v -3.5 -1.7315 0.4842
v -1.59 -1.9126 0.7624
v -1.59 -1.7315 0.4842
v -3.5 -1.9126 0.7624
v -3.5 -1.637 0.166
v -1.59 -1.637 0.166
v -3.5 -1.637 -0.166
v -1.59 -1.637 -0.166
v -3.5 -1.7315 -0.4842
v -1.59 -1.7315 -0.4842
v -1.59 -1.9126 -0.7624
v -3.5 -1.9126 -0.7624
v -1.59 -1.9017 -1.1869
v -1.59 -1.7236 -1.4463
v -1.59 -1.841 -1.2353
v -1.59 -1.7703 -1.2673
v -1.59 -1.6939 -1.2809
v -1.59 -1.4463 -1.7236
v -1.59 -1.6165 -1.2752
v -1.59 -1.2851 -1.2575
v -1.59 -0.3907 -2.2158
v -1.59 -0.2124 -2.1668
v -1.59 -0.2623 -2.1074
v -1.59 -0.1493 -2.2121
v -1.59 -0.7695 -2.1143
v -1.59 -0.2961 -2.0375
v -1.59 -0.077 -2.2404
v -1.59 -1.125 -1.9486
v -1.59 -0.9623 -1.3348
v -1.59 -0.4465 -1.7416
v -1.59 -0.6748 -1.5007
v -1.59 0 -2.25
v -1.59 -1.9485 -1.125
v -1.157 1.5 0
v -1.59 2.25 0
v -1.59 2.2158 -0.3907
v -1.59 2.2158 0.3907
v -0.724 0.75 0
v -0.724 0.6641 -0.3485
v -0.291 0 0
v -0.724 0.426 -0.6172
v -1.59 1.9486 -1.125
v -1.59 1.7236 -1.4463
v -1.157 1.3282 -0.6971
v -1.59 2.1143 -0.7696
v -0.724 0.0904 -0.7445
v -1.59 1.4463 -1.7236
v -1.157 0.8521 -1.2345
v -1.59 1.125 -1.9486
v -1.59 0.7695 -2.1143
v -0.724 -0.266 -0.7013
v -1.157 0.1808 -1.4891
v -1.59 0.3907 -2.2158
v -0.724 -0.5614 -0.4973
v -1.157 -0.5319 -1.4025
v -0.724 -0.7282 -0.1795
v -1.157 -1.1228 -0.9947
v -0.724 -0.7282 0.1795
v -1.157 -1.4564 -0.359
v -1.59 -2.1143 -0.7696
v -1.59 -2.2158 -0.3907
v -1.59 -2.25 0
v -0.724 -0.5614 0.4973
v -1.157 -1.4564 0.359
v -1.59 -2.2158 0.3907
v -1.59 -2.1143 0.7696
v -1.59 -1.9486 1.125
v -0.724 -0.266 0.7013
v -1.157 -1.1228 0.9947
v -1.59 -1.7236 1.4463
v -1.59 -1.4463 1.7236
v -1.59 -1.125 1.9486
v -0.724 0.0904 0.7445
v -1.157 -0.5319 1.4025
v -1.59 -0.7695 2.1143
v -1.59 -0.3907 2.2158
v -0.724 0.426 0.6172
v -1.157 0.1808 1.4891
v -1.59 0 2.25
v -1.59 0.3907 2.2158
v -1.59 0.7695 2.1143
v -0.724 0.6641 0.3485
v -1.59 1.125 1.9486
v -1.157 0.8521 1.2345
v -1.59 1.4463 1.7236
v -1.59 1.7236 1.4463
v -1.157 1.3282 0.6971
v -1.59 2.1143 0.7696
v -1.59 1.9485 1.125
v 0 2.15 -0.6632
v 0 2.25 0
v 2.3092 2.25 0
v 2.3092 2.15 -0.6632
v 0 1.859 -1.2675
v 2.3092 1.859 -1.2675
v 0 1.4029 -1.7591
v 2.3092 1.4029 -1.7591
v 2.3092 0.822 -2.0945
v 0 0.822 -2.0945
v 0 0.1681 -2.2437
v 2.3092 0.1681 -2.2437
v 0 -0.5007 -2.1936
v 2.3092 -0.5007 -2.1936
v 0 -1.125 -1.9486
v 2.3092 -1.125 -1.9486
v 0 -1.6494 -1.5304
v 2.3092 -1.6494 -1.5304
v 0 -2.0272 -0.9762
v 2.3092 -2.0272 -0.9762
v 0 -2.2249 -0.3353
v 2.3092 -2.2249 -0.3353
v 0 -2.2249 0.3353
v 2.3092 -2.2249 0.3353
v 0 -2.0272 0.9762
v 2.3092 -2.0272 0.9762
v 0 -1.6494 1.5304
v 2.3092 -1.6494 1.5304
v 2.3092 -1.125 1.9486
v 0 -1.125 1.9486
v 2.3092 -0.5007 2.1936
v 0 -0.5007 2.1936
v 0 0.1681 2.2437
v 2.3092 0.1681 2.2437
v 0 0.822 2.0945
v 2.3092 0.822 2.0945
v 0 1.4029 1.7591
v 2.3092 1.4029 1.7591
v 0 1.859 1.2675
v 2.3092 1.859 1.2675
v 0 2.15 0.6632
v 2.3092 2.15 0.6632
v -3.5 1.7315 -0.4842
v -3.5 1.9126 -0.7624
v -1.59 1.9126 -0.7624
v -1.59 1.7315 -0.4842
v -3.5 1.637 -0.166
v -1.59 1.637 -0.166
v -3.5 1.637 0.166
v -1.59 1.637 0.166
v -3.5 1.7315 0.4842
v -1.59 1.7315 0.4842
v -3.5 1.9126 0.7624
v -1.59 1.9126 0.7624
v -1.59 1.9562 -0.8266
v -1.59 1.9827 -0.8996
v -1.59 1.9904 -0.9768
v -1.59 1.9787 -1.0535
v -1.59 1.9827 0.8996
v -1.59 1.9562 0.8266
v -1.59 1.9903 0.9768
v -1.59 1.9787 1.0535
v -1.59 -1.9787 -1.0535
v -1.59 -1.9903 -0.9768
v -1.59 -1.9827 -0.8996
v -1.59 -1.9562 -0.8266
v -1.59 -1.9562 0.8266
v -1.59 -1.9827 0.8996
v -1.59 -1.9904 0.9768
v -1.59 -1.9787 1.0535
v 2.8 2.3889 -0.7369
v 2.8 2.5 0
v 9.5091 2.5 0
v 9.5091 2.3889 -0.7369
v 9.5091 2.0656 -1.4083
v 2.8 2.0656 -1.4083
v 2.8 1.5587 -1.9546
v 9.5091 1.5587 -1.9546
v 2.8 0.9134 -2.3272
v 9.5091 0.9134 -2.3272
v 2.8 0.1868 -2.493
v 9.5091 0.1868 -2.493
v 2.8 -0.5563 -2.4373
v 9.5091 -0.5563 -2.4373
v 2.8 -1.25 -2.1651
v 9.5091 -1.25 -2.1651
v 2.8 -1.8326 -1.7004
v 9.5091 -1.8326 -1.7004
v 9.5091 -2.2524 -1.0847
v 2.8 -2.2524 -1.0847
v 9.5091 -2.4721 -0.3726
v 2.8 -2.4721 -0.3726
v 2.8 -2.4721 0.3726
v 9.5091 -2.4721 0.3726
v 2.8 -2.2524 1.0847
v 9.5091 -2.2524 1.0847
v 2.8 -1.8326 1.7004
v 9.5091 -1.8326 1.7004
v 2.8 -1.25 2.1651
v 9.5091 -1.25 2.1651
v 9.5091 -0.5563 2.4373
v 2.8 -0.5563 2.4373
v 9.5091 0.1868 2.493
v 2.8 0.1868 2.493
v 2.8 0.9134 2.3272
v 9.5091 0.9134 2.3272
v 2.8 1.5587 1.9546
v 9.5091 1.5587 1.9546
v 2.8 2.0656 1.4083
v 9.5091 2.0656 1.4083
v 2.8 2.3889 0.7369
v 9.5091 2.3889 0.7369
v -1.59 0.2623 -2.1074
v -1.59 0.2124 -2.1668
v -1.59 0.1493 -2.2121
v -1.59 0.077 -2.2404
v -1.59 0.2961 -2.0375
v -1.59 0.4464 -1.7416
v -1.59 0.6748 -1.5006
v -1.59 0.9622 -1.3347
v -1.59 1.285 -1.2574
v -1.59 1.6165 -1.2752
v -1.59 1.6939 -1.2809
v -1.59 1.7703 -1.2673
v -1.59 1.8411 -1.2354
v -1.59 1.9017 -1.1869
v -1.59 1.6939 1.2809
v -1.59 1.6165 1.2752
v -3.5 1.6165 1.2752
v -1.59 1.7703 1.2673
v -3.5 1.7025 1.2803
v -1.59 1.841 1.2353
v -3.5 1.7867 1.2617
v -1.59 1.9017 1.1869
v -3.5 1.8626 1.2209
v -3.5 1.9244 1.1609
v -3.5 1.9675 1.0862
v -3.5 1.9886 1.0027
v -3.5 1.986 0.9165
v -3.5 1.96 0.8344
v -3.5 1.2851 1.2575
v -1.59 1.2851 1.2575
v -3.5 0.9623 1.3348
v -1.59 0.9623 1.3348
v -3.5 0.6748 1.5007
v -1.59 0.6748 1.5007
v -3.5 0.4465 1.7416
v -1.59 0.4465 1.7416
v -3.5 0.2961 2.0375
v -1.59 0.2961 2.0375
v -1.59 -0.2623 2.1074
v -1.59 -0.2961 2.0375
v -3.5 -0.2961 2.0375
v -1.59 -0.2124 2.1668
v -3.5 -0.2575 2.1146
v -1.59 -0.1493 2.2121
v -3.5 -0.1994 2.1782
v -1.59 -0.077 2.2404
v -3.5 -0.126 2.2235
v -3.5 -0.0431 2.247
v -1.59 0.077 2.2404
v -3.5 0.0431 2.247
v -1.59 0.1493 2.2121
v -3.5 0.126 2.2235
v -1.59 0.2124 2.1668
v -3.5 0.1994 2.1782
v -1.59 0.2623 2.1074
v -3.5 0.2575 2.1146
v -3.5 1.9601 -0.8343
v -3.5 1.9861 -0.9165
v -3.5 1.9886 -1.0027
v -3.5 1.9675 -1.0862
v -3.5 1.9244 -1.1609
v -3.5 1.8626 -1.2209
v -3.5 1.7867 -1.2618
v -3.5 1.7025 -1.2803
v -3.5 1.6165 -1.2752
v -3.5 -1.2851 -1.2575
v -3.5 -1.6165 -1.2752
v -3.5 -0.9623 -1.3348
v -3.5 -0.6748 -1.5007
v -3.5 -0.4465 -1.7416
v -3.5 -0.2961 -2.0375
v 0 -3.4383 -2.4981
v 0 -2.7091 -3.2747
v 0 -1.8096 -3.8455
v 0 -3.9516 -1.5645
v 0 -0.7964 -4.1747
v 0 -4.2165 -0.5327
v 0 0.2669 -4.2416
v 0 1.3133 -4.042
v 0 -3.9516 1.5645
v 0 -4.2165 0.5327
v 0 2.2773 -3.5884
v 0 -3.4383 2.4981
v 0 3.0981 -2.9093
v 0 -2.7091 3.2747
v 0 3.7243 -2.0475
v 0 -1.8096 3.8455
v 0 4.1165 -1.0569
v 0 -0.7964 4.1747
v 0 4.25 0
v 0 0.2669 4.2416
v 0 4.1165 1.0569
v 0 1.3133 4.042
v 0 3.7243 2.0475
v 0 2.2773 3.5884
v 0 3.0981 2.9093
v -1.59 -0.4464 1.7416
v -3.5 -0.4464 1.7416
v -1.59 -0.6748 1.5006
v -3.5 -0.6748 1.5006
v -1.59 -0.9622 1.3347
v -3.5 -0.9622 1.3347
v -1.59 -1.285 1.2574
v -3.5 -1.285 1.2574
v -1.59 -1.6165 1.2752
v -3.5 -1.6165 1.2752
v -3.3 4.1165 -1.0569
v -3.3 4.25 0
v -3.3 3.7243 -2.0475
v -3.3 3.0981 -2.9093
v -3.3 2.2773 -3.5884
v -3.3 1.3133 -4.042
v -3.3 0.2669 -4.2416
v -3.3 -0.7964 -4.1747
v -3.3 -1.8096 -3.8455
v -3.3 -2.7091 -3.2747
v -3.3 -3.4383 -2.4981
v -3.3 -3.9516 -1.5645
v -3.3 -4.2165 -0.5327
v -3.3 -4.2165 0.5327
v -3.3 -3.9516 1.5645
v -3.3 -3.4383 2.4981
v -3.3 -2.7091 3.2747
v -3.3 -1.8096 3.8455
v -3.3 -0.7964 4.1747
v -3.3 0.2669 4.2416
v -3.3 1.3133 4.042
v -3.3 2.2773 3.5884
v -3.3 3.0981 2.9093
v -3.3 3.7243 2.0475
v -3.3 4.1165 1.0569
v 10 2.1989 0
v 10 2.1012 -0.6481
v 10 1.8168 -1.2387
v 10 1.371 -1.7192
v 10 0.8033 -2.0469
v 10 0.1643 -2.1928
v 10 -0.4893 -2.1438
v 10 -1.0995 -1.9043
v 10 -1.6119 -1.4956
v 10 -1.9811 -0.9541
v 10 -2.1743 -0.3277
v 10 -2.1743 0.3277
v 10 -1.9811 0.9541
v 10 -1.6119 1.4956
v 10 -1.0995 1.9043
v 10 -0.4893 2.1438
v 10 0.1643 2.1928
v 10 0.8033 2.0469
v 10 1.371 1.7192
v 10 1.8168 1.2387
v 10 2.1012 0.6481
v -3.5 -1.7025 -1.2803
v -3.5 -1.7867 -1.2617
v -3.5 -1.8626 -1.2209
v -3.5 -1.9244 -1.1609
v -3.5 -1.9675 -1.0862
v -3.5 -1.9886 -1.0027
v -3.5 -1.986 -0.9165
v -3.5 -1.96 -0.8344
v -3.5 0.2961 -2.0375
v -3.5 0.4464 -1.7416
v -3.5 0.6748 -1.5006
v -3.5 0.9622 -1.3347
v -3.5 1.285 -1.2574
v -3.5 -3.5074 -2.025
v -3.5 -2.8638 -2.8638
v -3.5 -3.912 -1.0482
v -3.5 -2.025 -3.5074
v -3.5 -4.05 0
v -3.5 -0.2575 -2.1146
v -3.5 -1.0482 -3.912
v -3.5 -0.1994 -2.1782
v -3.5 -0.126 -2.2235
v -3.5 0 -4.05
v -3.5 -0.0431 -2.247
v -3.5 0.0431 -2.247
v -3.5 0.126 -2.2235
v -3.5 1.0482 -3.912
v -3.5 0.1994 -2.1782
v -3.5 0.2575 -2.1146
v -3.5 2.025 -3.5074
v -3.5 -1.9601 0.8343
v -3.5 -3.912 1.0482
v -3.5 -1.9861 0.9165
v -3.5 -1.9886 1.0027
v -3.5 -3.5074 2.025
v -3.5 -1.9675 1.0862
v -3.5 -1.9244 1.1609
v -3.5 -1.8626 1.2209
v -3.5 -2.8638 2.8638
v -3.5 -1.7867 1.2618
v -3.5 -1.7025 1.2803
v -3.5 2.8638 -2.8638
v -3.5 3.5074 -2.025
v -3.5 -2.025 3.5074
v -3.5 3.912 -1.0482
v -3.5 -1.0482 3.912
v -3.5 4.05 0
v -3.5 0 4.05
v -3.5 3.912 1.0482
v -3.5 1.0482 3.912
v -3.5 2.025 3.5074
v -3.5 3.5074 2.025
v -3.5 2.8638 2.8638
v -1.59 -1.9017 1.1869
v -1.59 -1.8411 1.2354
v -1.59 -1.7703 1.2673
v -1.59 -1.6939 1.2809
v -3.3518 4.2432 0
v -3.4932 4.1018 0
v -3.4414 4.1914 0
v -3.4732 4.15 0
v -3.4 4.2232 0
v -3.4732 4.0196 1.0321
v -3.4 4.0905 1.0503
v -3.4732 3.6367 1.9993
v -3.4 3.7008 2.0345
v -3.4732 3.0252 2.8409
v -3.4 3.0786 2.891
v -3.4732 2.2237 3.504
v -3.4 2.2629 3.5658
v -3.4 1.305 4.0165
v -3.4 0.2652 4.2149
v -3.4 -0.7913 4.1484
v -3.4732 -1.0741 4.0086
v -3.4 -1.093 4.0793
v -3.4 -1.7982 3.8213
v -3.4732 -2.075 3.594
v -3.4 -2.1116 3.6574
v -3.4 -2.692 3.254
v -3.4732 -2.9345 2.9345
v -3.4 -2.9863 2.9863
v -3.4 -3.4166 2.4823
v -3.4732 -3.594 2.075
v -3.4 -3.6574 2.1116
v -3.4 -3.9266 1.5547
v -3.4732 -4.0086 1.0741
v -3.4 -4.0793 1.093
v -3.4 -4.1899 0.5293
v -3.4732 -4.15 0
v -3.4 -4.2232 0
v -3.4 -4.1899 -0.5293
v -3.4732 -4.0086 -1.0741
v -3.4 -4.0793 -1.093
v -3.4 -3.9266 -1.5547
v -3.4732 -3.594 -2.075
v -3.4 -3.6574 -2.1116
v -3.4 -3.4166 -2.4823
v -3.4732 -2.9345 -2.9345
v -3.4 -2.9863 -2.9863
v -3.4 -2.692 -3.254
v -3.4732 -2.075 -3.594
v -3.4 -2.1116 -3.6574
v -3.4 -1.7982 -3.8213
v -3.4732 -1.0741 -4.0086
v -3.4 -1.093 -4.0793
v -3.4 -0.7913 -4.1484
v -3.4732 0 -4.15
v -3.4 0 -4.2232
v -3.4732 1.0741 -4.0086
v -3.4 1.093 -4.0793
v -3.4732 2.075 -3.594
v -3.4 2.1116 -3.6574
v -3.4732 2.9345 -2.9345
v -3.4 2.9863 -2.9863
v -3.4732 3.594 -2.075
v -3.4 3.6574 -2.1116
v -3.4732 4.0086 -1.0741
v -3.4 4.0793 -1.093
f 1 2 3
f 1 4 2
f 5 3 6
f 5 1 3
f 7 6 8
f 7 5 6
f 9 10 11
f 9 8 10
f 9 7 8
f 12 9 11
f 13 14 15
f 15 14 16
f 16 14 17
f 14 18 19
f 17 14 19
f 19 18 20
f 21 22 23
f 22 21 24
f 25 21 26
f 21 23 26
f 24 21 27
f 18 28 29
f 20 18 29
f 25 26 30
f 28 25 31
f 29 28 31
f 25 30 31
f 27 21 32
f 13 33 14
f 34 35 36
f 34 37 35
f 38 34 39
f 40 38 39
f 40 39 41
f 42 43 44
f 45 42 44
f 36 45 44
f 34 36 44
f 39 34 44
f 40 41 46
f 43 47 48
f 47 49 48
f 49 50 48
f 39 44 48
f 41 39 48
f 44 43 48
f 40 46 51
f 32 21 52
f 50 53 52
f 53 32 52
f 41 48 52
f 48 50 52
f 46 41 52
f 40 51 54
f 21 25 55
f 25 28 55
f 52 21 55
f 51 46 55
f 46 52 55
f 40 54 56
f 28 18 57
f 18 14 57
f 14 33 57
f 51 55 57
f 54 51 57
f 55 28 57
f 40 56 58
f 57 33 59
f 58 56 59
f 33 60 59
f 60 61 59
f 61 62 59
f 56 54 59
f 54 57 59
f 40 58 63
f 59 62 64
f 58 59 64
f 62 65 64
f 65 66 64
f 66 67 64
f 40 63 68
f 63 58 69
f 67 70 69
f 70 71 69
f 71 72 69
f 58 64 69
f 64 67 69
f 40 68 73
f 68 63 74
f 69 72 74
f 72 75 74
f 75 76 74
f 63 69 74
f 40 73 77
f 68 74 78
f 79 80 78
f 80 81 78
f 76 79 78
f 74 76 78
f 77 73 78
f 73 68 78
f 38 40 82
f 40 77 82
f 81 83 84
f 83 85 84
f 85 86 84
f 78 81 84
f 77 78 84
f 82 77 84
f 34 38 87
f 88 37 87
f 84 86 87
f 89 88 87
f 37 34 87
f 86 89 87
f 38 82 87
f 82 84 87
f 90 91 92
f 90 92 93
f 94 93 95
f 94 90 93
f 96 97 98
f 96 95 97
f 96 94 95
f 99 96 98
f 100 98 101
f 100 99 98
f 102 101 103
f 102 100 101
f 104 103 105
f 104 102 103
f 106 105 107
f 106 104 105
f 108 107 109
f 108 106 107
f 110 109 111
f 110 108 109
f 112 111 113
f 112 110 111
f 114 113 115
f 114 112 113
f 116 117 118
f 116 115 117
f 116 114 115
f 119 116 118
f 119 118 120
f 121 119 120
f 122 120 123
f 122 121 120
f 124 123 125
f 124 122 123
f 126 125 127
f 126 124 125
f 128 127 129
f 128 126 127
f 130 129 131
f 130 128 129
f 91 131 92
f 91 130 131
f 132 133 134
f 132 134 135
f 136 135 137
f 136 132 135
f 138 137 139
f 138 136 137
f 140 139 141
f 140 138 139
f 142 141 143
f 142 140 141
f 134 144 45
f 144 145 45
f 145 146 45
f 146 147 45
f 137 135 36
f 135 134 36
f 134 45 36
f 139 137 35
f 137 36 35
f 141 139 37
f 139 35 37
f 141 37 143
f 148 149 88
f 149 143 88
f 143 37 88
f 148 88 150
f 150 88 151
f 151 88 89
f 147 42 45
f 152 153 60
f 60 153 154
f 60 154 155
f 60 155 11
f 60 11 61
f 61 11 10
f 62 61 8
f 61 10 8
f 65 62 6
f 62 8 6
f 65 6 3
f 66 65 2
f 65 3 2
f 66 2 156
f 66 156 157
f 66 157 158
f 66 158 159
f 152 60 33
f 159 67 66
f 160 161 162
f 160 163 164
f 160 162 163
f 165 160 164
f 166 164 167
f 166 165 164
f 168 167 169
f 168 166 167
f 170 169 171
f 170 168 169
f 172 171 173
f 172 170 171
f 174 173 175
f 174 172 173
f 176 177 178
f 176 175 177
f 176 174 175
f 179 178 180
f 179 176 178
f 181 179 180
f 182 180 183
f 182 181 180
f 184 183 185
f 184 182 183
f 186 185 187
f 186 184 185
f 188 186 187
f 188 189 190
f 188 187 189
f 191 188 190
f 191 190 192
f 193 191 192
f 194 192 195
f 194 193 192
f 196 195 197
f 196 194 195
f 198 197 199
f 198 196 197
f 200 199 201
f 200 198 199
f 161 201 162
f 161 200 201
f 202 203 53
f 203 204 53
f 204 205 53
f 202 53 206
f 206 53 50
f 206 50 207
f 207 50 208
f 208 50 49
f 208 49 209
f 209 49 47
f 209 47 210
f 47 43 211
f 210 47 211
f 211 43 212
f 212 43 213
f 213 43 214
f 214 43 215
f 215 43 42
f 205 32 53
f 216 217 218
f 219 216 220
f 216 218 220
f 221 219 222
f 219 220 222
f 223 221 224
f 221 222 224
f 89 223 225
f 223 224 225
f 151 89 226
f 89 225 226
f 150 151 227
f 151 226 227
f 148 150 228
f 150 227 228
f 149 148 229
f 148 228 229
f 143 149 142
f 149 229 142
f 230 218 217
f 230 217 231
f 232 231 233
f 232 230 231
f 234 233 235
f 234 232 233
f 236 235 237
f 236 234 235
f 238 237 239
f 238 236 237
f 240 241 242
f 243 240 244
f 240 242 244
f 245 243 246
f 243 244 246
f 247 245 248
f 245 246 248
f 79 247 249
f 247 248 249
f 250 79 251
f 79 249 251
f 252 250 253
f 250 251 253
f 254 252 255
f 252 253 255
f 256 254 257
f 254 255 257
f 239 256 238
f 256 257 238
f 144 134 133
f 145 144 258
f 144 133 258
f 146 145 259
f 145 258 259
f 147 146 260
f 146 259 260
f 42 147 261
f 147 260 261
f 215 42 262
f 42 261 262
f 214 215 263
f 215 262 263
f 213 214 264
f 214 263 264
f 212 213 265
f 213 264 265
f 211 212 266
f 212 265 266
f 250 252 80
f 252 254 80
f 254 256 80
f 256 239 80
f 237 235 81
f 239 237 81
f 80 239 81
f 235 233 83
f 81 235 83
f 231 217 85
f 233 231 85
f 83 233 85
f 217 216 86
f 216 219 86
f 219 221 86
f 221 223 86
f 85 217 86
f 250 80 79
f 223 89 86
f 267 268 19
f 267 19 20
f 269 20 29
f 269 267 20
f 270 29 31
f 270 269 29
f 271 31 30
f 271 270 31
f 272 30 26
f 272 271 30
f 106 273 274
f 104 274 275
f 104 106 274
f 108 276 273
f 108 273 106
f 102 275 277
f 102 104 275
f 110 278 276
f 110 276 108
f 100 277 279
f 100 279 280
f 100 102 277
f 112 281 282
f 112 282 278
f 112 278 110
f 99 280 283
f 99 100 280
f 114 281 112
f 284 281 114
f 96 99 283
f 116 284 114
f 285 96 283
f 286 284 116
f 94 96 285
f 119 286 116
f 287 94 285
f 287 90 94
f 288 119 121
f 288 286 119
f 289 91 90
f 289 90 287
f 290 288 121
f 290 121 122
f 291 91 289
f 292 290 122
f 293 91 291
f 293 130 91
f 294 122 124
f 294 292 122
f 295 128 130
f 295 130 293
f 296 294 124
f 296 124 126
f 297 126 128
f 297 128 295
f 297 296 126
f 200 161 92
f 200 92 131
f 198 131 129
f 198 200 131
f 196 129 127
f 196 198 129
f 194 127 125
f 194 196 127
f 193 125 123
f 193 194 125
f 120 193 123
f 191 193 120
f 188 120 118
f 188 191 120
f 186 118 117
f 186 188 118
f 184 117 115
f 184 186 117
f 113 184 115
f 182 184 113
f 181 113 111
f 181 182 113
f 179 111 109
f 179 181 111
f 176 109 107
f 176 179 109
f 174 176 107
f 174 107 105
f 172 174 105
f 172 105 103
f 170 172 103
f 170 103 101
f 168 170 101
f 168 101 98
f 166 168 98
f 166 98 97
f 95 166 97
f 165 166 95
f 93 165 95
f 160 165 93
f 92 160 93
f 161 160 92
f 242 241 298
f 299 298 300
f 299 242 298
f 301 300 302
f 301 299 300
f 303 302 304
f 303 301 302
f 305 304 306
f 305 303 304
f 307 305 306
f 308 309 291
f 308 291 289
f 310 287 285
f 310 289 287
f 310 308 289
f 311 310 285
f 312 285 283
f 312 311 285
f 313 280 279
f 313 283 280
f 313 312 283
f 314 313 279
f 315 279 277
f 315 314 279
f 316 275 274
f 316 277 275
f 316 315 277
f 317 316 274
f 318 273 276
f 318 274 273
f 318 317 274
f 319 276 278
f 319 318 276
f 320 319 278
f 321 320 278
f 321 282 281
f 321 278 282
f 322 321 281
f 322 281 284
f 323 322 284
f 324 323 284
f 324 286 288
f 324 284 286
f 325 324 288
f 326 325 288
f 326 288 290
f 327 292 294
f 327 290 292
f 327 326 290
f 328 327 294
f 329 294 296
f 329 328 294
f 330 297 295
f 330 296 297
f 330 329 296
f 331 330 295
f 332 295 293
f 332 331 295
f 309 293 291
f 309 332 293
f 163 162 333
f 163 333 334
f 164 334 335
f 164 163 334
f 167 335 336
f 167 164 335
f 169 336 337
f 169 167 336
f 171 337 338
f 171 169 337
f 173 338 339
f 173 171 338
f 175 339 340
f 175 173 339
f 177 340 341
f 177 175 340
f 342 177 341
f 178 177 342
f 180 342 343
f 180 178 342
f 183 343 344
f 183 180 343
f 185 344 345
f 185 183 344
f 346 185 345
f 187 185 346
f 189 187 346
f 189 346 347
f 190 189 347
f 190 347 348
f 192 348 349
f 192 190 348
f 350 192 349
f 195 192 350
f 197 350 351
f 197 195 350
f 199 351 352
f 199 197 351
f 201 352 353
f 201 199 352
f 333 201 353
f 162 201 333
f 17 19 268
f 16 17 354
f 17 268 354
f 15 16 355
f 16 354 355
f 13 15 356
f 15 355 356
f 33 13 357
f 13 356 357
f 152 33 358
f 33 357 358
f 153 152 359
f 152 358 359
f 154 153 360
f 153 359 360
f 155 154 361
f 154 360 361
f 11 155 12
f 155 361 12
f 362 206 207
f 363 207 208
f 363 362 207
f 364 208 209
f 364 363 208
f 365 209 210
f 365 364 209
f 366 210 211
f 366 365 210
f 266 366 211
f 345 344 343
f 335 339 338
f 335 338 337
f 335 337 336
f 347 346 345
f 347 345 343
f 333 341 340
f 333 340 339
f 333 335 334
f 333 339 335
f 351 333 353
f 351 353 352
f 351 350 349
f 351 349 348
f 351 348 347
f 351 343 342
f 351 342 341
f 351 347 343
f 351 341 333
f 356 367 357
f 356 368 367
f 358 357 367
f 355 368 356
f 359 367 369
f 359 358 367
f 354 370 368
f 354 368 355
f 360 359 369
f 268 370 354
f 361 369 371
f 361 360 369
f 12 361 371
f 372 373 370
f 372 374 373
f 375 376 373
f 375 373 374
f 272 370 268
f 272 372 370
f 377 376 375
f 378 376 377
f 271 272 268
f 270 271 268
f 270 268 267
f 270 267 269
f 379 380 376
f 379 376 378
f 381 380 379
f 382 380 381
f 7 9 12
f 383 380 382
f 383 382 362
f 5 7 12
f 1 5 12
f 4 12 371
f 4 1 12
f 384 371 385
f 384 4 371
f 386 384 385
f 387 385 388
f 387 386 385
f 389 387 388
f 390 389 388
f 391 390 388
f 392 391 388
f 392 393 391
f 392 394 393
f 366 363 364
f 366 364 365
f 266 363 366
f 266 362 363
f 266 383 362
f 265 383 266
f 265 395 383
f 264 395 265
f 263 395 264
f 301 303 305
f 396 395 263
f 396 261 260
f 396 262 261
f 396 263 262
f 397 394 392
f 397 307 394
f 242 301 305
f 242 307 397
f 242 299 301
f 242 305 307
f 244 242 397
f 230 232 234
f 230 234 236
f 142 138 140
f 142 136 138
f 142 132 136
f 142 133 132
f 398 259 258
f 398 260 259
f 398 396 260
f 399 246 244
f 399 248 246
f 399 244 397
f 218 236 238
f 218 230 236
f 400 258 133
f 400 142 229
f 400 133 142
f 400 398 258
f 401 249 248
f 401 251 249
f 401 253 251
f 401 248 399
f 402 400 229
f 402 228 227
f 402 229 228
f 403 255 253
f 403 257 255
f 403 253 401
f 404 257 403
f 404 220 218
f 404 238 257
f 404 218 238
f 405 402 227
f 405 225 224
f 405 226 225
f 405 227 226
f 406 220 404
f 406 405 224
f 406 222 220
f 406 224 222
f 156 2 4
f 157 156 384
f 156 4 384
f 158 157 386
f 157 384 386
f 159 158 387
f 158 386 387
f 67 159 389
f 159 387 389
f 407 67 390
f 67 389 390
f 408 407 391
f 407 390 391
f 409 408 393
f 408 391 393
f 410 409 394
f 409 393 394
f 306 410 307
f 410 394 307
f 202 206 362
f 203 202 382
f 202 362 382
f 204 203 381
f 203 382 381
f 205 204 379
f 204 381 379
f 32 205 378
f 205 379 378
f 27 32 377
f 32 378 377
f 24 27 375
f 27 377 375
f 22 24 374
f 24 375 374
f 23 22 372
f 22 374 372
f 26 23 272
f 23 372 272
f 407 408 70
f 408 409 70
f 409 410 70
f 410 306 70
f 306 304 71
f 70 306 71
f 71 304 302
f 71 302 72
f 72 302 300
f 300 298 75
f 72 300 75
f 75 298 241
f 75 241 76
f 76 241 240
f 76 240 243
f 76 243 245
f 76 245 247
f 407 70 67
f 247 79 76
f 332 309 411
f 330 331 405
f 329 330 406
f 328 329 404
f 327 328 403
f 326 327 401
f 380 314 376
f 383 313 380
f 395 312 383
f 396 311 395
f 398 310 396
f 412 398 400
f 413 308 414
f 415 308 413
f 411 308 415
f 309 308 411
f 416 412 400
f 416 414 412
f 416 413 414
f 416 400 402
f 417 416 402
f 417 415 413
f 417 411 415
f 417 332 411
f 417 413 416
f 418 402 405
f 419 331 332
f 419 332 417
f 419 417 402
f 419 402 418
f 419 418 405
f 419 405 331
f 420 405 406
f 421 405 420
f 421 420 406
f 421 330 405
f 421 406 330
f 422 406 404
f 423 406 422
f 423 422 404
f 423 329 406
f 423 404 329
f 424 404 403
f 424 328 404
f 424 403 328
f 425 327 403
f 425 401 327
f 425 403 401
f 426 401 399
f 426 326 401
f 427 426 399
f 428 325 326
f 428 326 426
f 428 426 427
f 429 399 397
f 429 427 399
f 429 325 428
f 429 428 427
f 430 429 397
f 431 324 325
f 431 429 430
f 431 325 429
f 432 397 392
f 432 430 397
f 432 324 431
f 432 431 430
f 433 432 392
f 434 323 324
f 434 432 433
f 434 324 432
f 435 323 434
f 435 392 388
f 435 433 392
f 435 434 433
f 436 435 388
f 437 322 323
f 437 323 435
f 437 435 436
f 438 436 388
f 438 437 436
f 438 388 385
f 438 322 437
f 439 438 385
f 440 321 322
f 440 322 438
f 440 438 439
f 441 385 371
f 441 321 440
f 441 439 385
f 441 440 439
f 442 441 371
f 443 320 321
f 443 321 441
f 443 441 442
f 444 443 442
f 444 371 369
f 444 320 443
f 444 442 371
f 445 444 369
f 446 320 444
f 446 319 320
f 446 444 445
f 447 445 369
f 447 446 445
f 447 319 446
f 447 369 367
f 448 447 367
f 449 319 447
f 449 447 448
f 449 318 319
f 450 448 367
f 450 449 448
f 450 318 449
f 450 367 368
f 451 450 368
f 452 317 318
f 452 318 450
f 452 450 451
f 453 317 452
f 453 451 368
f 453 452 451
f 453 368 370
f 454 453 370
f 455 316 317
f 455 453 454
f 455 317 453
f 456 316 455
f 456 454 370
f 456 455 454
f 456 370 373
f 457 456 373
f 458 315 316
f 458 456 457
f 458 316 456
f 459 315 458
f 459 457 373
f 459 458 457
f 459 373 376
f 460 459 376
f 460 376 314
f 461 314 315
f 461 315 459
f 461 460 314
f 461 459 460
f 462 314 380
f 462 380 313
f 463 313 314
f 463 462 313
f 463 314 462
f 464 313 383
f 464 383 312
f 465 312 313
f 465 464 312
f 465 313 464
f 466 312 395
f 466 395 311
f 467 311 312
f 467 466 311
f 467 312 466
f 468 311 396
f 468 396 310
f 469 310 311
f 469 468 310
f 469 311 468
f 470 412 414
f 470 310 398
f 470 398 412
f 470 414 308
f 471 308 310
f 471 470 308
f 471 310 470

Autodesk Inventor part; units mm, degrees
ref_plane "YZ Plane" through (0, 0, 0) normal (1, 0, 0) x (0, 1, 0)
ref_plane "XZ Plane" through (0, 0, 0) normal (0, 1, 0) x (-1, 0, 0)
sketch "Szkic1" plane through (0, 0, 0) normal (0, 0, 1) x (1, 0, 0)
  line L0 (-0.291, 0) -> (10, 0)
  line L1 (10, 0) -> (10, 2.5)
  line L2 (10, 2.5) -> (2.8, 2.5)
  line L3 (2.8, 2.5) -> (2.3092, 2.25)
  line L4 (2.3092, 2.25) -> (0, 2.25)
  line L5 (0, 2.25) -> (0, 4.25)
  line L6 (0, 4.25) -> (-3.5, 4.25)
  line L7 (-3.5, 4.25) -> (-3.5, 2.25)
  line L8 (-3.5, 2.25) -> (-1.59, 2.25)
  line L9 (-1.59, 2.25) -> (-0.291, 0)
  line L10 (-6.2, 0) -> (12.7, 0) projected
  line L11 (0, -0.85) -> (0, 5.1) projected
  line L12 (2.8, 2.5) -> (0, 2.5) construction
  dimension "d1" = 7.2
  dimension "d2" = 0.4908
  dimension "d3" = 3.5
  dimension "d4" = 1.91
  dimension "d5" = 60
  dimension "d6" = 5
  dimension "d7" = 4.5
  dimension "d8" = 4.5
  dimension "d9" = 8.5
  dimension "d20" = 10
revolve "Bryła" add sketch "Szkic1" angle 360 about axis through (-0.291, 0, 0) along (1, 0, 0)
sketch "Szkic2" plane through (-3.5, 0, 0) normal (-1, 0, 0) x (0, 0, 1)
  line L0 (0, -5.95) -> (0, 5.95) projected
  line L1 (-5.95, 0) -> (5.95, 0) projected
  circle A0 centre (0, 0) radius 2.25 construction
  circle A1 centre (0, 0) radius 1.625 construction
  line L2 (0, 0) -> (1.9486, 1.125) construction
  line L3 (0, 0) -> (1.125, 1.9486) construction
  arc A2 (1.2752, 1.6165) -> (0.7624, 1.9126) centre (0.9688, 1.6779) ccw
  arc A3 (1.2752, 1.6165) -> (2.0375, 0.2961) centre (2.4069, 1.3897) ccw
  arc A4 (2.0375, -0.2961) -> (2.0375, 0.2961) centre (1.9375, 0) ccw
  arc A5 (2.0375, -0.2961) -> (1.2752, -1.6165) centre (2.4069, -1.3897) ccw
  arc A6 (-0.7624, 1.9126) -> (0.7624, 1.9126) centre (0, 2.7793) ccw
  arc A7 (-0.7624, 1.9126) -> (-1.2752, 1.6165) centre (-0.9688, 1.6779) ccw
  arc A8 (-2.0375, 0.2961) -> (-1.2752, 1.6165) centre (-2.4069, 1.3897) ccw
  arc A9 (-2.0375, 0.2961) -> (-2.0375, -0.2961) centre (-1.9375, 0) ccw
  arc A10 (-1.2752, -1.6165) -> (-2.0375, -0.2961) centre (-2.4069, -1.3897) ccw
  arc A11 (0.7624, -1.9126) -> (1.2752, -1.6165) centre (0.9688, -1.6779) ccw
  arc A12 (0.7624, -1.9126) -> (-0.7624, -1.9126) centre (0, -2.7793) ccw
  arc A13 (-1.2752, -1.6165) -> (-0.7624, -1.9126) centre (-0.9688, -1.6779) ccw
  circle A14 centre (0, 0) radius 2.25 projected
  dimension "d34" = 30
  dimension "d35" = 60
  dimension "d36" = 3.25
  dimension "d37" = 4.5
  dimension "d38" = 0.3125
extrude "Szczelina" add sketch "Szkic2" against normal blind 1.91 contours A14 A13 A12 L0 | L0 A12 A11 A14 | A14 A9 A10 A13 | A11 A5 A4 A14 | A14 A7 A8 A9 | A4 A3 A2 A14 | A6 A7 A14 L0 | L0 A14 A2 A6
fillet "Zaokrąglenie1" radius 0.2 1 edges at (-3.5, -4.25, 0)
thread "Gwint" size "M5x0.8" class "6g" standard "ISO Metric profile" length 7.2
chamfer "Faza1" distance 0.3011 distance2 0.4909 1 edges at (10, -2.5, 0) measured on face at (10, -0.7741, -0.6858)
ref_plane "Work Plane1" through (6.4, 0, 0) normal (0, -0.6331, -0.774) x (1, 0, 0)
equation "\"d1\" = GEL"
equation "\"d2\" = GAL"
equation "\"d3\" = KOH"
equation "\"d4\" = INTI"
equation "\"d6\" = GD"
equation "\"d7\" = BDM"
equation "\"d8\" = SW"
equation "\"d9\" = KOD"
equation "\"d20\" = NLG"
equation "\"d36\" = E0"
equation "\"d37\" = SW"
equation "\"d38\" = -0.25 * E0 + 0.25 * SW"
equation "\"d11\" = INTI"
equation "\"d17\" = RR"
equation "\"d13\" = GEL"
equation "\"d15\" = -0.5 * SPD + 0.5 * GD"
equation "\"GD\" = NND"
equation "\"NLG\" = 10"
equation "\"GEL\" = 7.2"
equation "\"KOD\" = 8.5"
equation "\"KOH\" = 3.5"
equation "\"INTI\" = 1.91"
equation "\"GAL\" = 0.61345 * PTC"
equation "\"GUL\" = 0.61345 * PTC"
equation "\"BDM\" = 4.5"
equation "\"SW\" = 4.5"
equation "\"RR\" = 0.2"
equation "\"SPD\" = NND - 1.2269 * GAL"
equation "\"E0\" = 3.25"
equation "\"TOA\" = 30deg"
equation "\"GD1\" = THREADDIA - 1.2269 * PTC"
equation "\"THREADDIA\" = 5"
equation "\"PTC\" = 0.8"
equation "\"NND\" = 5"
equation "\"RRK\" = 0.35"
properties part number "NF E 25-130 - M5 x 10" material "Stal, miękka"
